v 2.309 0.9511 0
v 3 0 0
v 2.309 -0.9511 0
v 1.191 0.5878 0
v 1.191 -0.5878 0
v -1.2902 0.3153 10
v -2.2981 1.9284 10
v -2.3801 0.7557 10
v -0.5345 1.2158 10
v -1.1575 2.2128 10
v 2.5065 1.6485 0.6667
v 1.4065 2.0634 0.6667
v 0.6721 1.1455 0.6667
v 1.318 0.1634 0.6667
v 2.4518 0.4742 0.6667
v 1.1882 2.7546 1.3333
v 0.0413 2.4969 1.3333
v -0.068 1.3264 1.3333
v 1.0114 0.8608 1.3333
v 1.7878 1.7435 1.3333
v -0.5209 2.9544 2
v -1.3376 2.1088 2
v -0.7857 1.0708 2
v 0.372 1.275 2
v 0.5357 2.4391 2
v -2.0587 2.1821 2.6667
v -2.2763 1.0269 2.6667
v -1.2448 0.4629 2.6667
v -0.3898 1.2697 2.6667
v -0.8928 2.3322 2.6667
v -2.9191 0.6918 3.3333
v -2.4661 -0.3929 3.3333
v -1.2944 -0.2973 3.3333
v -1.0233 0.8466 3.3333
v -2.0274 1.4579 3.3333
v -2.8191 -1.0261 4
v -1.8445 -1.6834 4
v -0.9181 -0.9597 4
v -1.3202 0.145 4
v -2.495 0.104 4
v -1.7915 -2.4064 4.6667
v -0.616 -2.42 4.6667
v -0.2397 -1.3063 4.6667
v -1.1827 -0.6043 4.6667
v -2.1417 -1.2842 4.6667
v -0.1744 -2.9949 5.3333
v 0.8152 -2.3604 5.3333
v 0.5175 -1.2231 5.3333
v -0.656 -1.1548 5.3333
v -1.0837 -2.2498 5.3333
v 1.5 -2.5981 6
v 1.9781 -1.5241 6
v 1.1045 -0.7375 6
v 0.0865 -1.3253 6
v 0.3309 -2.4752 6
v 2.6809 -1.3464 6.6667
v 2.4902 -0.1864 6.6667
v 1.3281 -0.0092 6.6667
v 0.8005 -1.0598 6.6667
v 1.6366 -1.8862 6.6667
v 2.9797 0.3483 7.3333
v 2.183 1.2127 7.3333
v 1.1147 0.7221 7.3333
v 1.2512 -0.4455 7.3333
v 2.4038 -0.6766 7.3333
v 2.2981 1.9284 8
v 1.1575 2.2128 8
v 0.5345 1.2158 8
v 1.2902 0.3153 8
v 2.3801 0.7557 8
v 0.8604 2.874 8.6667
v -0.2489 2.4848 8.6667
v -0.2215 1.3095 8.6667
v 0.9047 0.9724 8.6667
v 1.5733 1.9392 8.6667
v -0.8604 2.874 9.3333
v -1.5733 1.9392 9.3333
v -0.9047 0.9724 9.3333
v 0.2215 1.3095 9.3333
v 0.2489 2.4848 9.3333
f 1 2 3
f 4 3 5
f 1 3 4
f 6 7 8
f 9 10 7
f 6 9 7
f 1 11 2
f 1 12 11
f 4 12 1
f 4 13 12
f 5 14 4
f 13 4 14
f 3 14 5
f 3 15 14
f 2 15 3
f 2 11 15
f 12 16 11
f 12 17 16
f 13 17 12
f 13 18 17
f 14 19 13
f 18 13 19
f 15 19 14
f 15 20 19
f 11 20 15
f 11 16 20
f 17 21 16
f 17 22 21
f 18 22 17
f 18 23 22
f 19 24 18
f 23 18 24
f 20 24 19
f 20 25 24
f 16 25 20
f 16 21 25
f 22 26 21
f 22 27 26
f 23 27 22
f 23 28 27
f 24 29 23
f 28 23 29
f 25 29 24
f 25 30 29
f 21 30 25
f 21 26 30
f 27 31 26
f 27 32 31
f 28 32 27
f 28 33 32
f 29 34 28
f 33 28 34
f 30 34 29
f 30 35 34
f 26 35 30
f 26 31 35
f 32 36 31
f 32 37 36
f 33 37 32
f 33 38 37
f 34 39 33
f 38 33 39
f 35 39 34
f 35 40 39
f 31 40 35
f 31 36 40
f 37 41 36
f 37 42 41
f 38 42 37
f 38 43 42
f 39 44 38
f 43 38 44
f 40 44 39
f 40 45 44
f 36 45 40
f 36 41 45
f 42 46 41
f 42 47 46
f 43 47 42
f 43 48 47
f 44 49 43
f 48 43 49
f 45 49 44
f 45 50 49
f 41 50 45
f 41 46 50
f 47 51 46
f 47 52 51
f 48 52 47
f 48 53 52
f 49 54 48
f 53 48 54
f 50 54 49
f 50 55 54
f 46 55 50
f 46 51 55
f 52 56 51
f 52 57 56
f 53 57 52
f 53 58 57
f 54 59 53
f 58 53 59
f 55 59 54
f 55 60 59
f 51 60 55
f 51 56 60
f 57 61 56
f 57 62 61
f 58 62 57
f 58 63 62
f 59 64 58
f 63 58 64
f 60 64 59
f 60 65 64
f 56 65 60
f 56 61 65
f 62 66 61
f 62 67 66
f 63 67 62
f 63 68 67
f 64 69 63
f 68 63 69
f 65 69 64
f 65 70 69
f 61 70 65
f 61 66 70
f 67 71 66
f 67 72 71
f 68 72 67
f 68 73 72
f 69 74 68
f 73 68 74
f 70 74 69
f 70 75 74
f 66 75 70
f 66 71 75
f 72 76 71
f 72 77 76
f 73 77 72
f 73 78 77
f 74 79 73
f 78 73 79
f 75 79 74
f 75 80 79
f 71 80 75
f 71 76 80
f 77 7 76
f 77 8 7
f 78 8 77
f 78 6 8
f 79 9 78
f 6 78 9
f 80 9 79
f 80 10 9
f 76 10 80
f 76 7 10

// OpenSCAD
// Unit of length: Unit.MM
linear_extrude(height = 10.0, center = false, convexity = 10, twist = -500.0, scale = 1.0)
{
   translate(v = [2.0, 0.0])
   {
      circle(r = 1.0);
   }
}
